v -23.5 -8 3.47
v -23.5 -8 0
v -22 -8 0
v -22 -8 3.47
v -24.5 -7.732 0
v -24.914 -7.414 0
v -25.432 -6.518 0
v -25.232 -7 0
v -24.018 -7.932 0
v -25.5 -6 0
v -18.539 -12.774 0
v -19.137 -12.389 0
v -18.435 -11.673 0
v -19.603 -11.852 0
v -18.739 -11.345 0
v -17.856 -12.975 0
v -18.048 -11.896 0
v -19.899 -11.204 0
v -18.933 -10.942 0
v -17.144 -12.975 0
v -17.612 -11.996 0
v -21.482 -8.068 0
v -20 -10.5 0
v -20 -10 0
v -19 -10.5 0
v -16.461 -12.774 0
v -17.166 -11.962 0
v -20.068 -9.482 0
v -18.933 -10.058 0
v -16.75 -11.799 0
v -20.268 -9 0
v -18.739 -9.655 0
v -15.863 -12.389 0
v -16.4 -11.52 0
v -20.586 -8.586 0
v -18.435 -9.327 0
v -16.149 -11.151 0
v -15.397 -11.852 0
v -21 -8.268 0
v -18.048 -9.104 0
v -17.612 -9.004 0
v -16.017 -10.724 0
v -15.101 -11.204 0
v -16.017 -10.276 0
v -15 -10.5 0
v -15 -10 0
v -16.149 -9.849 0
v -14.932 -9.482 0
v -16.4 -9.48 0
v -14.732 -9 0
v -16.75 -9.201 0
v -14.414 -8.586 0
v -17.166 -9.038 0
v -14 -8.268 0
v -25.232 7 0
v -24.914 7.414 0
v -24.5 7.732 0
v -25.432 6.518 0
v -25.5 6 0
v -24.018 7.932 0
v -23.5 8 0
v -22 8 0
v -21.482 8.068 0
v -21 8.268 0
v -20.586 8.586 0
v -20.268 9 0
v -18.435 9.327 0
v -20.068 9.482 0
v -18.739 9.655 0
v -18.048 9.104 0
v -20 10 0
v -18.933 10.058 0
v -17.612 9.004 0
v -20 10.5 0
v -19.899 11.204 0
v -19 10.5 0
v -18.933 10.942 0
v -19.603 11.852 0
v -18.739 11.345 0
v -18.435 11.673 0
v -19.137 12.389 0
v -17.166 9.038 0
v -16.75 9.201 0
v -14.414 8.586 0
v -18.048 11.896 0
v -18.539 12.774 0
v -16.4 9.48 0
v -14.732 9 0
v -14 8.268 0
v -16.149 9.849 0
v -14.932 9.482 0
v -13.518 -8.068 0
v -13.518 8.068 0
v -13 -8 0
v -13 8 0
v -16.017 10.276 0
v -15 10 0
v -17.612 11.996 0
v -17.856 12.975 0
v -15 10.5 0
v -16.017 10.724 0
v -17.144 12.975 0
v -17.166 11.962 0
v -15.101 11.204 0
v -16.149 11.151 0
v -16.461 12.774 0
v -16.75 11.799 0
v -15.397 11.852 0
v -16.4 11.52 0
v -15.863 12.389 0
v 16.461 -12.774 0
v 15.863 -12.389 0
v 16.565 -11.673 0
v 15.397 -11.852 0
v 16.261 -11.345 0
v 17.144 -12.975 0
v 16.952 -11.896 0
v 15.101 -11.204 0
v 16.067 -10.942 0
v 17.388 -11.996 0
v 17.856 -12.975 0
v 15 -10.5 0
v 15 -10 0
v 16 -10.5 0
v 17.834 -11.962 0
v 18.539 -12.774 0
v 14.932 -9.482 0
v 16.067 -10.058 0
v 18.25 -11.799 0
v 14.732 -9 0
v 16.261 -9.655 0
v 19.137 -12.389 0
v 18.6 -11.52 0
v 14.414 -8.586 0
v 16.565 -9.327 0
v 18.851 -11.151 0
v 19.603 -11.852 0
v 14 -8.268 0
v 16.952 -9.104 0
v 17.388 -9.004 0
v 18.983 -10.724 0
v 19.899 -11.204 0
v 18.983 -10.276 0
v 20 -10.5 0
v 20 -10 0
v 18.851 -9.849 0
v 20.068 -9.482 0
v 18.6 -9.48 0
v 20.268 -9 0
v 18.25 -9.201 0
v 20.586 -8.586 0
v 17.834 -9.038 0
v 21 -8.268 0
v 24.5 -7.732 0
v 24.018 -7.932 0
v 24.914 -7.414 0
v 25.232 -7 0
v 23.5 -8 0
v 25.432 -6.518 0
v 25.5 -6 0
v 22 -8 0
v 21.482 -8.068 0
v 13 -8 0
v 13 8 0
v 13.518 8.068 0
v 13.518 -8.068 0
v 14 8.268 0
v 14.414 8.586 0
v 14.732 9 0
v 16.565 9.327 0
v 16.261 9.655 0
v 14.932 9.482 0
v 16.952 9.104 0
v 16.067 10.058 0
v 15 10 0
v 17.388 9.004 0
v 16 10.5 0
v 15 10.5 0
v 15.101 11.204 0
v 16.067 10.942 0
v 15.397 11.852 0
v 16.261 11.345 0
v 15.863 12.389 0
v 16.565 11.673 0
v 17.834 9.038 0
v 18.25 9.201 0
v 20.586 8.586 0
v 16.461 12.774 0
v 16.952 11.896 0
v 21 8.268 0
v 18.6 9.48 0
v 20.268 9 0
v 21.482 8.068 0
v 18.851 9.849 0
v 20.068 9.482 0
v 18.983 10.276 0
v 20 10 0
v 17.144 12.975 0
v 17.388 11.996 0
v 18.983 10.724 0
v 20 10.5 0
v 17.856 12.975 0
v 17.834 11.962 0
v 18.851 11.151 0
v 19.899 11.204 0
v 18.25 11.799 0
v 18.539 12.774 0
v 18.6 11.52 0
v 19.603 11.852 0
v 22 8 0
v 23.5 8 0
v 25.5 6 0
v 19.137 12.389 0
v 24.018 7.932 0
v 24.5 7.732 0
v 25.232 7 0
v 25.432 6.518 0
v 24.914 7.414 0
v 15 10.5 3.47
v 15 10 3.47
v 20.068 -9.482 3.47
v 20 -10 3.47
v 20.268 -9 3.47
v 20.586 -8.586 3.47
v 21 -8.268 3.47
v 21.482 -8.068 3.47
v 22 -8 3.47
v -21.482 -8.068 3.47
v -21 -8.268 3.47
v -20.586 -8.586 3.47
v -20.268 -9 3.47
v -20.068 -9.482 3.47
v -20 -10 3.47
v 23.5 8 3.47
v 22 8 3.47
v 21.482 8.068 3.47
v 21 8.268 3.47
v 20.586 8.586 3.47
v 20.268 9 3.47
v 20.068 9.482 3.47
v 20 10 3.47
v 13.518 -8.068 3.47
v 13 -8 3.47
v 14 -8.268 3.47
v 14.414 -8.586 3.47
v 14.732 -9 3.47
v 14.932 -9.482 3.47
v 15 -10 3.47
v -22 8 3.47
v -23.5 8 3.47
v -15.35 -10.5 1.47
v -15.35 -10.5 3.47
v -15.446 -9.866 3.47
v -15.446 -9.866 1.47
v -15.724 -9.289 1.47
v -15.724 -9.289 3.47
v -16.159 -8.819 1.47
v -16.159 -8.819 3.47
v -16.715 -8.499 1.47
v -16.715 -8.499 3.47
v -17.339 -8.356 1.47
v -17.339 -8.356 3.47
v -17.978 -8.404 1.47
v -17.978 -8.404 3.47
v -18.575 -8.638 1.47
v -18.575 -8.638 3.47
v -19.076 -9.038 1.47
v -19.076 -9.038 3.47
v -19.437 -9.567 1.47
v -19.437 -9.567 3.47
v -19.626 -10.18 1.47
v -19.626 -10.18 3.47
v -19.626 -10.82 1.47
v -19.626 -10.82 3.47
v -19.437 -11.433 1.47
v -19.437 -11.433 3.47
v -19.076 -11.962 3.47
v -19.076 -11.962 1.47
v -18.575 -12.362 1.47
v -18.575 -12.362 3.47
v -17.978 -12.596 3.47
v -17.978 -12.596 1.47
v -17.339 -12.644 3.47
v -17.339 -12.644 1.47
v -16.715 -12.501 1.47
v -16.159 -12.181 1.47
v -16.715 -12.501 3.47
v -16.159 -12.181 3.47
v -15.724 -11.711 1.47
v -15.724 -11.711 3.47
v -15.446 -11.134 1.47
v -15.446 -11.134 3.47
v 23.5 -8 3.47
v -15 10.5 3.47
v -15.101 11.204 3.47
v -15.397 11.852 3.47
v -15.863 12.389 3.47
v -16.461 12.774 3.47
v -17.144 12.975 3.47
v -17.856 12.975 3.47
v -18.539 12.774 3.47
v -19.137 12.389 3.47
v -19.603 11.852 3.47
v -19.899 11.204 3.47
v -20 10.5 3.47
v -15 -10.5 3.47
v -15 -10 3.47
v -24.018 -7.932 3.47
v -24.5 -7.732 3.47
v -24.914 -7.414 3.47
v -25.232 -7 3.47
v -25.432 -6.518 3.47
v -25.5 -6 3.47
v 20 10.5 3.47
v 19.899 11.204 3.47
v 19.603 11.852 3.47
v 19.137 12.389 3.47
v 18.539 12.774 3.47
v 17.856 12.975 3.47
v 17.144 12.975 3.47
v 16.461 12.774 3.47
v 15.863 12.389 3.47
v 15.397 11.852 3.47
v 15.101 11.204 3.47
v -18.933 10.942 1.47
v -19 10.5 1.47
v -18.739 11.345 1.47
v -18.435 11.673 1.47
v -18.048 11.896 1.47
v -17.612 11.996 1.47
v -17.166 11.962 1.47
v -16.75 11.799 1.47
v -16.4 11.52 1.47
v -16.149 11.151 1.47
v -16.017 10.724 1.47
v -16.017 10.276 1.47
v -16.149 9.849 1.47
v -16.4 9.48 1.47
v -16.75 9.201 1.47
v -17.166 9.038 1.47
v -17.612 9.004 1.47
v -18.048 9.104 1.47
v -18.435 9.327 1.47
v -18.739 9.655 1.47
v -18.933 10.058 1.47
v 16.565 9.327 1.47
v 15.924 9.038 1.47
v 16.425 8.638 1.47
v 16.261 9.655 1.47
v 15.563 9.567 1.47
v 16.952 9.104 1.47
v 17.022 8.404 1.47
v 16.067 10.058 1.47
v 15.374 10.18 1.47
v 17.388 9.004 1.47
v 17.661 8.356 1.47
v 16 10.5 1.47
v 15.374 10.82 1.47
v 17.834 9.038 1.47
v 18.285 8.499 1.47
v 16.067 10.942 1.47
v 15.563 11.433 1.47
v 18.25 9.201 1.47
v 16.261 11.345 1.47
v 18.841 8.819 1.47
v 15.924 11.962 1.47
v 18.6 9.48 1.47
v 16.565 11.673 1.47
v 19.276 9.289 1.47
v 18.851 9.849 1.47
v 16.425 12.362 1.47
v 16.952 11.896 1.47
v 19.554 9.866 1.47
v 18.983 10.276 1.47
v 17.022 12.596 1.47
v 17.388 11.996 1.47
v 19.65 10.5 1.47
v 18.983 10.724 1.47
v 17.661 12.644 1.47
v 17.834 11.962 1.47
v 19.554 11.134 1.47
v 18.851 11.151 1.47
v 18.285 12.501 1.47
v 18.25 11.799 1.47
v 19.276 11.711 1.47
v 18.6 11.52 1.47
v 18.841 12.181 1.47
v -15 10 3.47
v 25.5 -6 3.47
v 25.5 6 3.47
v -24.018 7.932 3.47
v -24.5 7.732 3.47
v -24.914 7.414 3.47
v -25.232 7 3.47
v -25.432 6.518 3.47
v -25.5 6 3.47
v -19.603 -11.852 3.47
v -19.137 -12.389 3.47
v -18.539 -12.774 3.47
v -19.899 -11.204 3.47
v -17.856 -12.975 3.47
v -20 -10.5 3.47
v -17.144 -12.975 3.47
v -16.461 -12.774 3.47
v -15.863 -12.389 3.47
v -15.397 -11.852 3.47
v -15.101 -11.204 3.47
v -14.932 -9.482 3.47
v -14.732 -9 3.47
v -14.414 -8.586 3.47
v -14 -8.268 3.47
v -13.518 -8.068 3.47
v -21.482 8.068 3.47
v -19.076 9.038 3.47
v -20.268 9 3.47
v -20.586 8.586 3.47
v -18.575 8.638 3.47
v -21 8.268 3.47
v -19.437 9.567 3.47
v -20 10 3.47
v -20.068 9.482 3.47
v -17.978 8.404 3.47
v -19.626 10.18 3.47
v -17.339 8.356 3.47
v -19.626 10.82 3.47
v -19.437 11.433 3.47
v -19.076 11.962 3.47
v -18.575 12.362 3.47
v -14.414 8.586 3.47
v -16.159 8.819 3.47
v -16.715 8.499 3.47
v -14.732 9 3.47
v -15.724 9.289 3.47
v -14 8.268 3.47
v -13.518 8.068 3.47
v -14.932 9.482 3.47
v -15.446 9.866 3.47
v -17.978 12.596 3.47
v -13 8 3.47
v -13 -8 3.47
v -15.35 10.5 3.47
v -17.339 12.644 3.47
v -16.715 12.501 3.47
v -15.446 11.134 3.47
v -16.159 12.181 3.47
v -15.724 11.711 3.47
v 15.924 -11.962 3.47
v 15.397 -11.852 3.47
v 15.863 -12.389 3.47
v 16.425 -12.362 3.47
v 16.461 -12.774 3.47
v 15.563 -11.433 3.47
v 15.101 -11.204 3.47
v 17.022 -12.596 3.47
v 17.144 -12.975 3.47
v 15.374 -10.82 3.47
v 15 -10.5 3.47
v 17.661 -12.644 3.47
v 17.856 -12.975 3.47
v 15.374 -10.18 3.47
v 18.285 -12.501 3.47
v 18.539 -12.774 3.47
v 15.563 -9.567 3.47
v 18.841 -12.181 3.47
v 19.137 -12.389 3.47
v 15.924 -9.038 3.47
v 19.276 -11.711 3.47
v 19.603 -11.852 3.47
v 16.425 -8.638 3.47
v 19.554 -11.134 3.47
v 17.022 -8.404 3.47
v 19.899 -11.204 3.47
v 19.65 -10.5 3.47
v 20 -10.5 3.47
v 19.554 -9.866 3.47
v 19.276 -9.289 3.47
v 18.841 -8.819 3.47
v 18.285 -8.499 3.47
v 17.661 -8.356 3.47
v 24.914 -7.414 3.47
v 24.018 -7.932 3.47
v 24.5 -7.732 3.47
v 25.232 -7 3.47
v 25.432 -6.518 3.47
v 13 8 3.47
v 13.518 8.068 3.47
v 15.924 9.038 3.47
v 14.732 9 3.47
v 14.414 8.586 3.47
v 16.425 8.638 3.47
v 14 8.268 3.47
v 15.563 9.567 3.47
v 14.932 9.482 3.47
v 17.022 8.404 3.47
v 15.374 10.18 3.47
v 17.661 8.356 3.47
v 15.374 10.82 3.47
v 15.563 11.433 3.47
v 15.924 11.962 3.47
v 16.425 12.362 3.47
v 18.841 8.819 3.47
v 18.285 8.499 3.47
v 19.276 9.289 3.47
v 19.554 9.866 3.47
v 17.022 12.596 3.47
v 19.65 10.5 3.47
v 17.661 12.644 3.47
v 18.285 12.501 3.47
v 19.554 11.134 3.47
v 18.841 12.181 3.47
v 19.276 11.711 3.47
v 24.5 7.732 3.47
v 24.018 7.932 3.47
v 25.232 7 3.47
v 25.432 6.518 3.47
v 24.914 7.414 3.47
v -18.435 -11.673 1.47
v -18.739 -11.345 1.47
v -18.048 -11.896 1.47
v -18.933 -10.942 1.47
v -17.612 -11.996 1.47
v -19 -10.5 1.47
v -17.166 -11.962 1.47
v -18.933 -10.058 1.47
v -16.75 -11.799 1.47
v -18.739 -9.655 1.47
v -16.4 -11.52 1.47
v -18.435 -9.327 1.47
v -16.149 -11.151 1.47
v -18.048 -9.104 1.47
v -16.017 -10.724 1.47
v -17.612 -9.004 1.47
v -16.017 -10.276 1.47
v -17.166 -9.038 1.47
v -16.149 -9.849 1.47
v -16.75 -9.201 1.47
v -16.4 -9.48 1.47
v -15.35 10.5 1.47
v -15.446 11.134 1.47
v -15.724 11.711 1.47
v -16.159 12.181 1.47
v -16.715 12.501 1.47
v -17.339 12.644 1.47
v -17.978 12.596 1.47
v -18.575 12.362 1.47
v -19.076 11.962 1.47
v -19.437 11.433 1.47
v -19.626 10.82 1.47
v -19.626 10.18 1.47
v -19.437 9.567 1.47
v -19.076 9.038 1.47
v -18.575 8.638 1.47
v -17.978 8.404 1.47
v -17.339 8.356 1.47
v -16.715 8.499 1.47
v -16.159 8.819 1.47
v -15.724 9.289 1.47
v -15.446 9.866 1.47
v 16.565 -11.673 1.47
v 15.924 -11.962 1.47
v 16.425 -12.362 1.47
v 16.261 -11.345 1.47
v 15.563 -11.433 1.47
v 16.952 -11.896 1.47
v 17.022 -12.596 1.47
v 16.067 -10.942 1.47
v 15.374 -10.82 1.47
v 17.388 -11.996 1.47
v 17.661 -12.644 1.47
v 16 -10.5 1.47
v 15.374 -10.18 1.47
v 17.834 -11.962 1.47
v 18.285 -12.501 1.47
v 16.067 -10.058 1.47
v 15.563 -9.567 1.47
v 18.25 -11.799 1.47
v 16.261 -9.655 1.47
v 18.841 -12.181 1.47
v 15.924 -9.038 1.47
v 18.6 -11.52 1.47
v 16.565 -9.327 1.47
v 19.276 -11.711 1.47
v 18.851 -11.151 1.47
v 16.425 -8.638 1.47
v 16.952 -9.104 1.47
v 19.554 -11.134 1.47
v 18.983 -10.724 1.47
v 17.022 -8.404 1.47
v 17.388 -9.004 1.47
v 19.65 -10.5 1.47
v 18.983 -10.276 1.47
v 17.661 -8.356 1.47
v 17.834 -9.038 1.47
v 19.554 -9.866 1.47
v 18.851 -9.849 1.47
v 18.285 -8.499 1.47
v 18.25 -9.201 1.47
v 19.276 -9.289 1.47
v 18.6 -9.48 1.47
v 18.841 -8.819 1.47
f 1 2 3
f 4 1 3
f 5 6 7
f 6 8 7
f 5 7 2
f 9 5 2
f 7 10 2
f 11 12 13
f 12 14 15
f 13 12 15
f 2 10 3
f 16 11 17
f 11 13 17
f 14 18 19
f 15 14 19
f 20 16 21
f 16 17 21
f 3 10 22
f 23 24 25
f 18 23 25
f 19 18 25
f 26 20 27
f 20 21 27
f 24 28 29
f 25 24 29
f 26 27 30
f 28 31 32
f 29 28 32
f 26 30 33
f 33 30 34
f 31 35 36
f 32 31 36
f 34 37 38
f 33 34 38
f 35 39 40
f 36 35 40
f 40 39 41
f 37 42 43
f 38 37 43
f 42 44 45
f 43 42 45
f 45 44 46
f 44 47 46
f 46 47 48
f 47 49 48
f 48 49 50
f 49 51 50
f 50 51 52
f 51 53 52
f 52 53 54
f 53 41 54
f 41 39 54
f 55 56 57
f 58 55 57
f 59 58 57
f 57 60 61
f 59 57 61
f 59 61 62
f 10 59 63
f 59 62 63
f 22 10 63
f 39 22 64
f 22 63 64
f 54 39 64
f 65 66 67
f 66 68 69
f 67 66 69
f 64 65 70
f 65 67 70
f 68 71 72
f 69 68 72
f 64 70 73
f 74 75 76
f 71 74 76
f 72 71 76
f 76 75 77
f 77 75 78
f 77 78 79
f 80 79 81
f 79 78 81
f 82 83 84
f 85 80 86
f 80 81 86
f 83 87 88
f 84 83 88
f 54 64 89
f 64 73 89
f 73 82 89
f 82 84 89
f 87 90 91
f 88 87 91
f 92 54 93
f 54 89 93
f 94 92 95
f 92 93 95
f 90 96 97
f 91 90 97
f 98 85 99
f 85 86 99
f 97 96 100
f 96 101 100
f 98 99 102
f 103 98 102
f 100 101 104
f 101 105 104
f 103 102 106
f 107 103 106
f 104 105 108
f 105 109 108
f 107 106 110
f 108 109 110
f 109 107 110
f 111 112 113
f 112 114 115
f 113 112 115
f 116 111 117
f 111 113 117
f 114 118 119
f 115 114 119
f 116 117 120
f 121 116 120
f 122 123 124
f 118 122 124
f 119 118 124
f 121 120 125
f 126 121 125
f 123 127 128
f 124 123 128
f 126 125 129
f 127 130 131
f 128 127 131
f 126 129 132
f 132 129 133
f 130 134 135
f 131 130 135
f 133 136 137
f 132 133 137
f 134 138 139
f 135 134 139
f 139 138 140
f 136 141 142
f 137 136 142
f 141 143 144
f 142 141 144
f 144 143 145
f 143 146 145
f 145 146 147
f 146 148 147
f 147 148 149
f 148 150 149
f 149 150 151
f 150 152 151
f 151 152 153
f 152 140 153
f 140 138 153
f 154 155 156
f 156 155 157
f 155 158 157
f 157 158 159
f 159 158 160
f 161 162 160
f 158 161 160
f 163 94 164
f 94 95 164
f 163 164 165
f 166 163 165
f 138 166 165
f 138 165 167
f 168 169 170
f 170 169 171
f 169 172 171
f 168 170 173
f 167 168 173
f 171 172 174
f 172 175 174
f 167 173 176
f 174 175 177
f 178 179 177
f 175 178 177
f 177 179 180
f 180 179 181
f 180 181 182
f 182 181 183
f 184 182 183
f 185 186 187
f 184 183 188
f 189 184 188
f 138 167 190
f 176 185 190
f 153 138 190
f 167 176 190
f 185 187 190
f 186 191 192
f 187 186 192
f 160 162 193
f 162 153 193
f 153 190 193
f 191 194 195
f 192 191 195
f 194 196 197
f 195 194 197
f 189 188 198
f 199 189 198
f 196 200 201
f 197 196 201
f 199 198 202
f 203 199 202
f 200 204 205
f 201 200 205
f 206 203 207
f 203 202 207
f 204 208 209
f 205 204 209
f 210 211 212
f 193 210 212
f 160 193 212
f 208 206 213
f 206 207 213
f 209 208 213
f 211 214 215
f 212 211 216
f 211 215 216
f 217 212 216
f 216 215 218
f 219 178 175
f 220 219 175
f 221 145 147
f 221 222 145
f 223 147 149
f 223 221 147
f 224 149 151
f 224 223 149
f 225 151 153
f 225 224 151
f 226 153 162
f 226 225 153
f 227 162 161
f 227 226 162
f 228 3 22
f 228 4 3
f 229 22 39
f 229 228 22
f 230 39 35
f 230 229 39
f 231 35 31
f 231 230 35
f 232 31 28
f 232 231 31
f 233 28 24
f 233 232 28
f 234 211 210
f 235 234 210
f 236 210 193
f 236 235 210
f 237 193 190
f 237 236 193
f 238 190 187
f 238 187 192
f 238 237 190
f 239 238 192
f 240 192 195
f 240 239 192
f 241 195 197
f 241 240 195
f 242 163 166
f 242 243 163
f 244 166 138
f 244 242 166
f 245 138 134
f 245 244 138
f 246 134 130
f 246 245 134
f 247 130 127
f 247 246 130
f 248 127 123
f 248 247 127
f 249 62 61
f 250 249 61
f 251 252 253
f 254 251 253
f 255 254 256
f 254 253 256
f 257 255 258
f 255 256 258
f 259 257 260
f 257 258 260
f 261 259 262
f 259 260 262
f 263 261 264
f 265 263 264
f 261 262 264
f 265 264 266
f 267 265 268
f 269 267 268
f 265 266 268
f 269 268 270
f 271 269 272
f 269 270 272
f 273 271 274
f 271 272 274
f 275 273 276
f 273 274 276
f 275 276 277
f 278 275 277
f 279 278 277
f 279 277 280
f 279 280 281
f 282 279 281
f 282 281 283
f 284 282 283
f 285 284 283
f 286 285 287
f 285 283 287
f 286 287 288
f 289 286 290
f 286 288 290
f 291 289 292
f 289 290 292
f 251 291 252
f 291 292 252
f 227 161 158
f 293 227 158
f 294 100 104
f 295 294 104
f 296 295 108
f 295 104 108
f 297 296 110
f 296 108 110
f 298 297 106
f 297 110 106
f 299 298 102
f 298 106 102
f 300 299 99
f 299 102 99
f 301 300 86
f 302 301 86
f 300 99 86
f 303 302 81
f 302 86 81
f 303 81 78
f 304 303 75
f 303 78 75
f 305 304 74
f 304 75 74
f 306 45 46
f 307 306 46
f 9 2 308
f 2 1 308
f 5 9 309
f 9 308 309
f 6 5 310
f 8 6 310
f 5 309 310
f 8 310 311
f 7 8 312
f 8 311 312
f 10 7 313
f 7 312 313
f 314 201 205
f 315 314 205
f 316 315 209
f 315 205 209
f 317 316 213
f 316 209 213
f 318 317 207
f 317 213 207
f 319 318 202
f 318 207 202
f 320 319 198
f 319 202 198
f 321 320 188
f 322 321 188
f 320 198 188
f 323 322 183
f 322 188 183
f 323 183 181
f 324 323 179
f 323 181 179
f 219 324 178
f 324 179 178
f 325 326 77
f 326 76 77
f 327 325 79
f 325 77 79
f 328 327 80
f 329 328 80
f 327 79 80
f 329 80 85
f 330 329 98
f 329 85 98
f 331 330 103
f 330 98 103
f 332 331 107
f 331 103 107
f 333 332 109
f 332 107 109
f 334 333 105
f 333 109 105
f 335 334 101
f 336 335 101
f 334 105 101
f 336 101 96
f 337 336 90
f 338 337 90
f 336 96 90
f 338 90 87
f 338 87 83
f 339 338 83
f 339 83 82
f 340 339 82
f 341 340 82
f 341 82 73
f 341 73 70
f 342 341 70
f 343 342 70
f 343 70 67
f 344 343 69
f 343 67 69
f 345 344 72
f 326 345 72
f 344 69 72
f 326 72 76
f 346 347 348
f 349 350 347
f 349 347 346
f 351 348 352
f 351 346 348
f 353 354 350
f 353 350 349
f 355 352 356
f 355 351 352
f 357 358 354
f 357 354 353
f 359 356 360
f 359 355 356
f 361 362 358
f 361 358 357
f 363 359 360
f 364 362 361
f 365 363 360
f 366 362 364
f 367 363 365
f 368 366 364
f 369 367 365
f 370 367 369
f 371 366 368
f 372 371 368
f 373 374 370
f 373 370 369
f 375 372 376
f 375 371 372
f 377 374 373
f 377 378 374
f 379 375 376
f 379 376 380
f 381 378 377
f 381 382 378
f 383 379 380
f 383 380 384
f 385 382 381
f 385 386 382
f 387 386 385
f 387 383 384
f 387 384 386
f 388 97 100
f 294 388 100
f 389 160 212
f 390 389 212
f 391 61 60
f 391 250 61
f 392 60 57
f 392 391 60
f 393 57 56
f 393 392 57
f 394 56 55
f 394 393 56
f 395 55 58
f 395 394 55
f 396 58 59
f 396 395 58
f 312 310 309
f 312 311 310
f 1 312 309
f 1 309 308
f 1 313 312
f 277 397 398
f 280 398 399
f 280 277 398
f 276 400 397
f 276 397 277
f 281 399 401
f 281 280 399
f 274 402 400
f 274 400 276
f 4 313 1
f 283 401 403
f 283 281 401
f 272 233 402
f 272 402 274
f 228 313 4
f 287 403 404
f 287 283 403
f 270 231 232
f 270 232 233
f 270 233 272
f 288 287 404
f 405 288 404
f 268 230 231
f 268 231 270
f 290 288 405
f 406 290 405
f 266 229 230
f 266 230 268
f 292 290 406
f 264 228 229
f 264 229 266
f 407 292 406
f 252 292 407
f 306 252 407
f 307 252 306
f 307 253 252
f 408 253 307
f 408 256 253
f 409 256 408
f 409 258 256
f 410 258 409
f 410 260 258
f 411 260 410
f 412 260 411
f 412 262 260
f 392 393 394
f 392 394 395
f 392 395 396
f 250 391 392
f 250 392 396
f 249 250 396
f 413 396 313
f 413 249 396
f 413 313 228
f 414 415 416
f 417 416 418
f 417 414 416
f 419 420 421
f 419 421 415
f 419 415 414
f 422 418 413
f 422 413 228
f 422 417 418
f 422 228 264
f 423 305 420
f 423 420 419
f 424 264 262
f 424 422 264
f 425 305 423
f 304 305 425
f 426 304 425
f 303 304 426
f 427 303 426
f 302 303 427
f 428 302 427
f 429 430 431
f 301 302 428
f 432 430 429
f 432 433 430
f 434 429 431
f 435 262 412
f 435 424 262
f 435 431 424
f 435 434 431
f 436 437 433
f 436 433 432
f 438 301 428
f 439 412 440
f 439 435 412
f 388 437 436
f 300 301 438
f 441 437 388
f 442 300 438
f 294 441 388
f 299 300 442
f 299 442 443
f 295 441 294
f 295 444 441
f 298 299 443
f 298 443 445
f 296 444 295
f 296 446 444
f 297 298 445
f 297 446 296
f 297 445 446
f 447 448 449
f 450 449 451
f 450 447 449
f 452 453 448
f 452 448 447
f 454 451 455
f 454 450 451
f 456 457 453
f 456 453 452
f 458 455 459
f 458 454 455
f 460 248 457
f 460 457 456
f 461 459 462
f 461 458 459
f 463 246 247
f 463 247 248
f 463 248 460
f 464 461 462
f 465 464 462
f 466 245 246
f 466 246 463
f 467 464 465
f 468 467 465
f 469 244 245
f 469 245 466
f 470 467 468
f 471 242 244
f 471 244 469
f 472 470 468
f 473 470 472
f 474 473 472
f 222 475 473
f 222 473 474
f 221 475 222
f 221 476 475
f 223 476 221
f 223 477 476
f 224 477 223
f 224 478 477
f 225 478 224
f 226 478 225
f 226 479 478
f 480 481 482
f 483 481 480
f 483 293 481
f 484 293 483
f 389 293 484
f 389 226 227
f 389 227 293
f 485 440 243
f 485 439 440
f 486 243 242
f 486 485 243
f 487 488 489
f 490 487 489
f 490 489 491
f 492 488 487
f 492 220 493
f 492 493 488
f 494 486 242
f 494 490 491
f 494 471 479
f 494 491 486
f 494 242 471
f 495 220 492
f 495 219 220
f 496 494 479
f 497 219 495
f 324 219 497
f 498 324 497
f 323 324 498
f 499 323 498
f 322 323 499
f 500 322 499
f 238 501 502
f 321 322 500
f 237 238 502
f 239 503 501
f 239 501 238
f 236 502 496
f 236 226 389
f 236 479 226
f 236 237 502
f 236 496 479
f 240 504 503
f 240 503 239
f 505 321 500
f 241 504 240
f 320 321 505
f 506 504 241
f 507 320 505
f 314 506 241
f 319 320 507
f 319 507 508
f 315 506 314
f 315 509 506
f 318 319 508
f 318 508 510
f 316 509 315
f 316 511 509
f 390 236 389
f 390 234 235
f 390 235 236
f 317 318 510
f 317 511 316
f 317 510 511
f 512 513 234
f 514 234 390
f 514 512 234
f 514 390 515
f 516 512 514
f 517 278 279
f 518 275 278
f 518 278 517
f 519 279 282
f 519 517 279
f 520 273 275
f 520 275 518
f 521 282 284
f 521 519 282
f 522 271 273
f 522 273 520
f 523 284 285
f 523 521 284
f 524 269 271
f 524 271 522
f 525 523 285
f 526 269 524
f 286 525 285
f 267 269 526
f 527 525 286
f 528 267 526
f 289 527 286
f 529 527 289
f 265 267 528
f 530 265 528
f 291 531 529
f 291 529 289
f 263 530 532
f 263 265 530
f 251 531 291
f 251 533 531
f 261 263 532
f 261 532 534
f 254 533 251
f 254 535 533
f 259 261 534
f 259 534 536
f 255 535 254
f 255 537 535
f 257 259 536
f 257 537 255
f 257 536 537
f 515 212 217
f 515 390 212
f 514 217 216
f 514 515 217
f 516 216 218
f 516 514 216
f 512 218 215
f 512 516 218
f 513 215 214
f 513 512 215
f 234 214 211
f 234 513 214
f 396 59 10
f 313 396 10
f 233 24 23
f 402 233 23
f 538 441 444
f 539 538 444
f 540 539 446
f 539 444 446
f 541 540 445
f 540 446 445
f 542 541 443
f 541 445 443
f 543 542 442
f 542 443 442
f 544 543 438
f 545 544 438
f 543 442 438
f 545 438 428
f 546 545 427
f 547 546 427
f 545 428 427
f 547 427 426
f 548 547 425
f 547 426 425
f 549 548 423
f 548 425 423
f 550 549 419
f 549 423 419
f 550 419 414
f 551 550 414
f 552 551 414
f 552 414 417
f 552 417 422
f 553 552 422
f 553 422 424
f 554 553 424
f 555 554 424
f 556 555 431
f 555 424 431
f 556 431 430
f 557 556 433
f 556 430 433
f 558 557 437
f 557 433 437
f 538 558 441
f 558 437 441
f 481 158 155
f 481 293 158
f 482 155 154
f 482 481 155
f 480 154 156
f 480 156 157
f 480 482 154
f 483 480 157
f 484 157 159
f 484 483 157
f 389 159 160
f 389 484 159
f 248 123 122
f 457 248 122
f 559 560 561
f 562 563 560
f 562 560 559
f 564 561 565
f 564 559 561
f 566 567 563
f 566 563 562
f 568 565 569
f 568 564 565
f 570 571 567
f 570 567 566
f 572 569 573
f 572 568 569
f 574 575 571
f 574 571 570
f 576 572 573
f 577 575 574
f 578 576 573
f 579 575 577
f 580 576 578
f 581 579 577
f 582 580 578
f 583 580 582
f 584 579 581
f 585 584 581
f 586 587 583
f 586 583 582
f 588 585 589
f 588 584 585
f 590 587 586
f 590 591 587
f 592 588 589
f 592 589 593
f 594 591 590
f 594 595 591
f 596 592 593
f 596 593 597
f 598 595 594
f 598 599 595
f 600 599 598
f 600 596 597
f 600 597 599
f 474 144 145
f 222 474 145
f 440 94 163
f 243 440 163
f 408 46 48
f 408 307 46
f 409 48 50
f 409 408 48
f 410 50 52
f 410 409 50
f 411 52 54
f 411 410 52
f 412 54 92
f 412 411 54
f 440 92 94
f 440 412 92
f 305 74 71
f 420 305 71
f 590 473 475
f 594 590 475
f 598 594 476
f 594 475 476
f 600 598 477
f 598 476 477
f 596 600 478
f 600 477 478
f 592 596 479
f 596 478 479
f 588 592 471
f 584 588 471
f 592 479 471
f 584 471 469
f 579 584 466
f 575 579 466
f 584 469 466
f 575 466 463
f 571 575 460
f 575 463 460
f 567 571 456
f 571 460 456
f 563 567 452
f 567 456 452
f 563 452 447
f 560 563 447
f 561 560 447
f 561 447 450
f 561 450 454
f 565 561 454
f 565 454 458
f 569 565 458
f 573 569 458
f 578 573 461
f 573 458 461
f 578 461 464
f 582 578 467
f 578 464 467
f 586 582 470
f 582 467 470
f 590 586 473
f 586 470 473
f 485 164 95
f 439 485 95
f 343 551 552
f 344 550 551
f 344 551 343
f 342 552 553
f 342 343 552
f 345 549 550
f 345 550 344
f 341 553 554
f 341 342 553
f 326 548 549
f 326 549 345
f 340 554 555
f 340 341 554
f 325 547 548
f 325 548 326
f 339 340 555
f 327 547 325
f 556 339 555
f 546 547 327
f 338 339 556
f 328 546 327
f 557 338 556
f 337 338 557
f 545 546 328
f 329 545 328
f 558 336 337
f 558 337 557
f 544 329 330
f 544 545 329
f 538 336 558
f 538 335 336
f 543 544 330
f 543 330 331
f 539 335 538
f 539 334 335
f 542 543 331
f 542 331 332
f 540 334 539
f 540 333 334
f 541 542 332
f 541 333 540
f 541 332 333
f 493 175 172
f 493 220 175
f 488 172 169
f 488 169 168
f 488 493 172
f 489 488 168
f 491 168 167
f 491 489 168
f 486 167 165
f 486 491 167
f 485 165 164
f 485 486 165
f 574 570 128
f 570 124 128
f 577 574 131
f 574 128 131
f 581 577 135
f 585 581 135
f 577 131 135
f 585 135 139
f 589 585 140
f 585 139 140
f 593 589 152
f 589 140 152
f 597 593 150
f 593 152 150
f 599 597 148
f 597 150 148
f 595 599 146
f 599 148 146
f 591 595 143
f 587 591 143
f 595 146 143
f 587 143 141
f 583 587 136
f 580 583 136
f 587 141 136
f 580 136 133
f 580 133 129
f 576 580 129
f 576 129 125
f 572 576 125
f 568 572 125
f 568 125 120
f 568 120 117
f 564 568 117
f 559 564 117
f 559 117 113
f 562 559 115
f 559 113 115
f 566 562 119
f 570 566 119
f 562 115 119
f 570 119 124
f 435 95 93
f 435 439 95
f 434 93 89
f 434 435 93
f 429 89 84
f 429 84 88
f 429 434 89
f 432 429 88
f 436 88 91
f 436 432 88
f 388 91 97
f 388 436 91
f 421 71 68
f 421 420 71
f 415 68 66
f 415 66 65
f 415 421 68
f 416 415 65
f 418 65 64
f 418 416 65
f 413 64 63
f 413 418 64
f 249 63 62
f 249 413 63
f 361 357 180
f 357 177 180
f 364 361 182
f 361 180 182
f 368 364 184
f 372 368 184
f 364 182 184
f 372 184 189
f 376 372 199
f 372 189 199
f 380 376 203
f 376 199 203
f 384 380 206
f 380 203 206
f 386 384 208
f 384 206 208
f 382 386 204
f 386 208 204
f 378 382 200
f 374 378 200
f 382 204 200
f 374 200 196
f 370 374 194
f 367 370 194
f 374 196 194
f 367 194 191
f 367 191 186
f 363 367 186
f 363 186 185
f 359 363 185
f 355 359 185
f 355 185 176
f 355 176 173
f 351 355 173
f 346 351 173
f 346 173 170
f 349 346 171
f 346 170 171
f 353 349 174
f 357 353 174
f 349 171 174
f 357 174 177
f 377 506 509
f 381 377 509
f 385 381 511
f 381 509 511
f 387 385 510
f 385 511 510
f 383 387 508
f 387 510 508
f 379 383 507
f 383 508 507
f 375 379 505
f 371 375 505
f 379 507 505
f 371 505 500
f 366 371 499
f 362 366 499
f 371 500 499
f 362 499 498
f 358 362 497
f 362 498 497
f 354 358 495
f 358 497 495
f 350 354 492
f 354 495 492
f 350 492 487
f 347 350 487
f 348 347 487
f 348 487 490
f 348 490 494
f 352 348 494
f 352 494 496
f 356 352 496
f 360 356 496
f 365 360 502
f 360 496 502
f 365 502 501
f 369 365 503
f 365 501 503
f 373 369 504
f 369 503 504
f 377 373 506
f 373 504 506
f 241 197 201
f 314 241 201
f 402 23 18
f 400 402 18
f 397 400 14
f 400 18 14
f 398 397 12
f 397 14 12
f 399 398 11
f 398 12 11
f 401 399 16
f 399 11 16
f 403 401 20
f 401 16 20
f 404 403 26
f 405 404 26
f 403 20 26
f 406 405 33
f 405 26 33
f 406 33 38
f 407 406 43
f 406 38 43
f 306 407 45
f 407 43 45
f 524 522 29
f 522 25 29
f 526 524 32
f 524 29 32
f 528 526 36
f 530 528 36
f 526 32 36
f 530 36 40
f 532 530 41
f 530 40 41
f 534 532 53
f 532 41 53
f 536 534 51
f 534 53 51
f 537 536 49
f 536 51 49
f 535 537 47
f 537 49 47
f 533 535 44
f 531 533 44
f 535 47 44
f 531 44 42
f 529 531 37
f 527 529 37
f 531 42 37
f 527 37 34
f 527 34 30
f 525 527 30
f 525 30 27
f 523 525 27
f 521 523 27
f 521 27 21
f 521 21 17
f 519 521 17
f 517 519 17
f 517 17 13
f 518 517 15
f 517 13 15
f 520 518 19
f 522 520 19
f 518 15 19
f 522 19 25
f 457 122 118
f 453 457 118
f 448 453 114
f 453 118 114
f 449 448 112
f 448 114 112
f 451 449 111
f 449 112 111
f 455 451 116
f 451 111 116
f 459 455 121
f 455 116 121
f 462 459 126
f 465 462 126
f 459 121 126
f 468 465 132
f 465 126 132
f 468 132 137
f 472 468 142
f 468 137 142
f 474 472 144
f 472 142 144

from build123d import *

# Parameters (mm, degrees)
EXTRUDE_1_DEPTH     = 3.47
FILLET_1_R          = 2
MM_1_D              = 3
MM_1_CSINK_D        = 3.05
MM_1_CSINK_ANGLE    = 90
SKETCH_5_R          = 2.15
CUT_EXTRUDE_1_DEPTH = 2


with BuildPart() as part:
    # 草图1 → 凸台-拉伸1 (new body)
    with BuildSketch(Plane.XY):
        with BuildLine():
            Line((-25.5, -8), (-20, -8))
            Line((-20, -8), (-20, -10.5))
            ThreePointArc((-20, -10.5), (-17.5, -13), (-15, -10.5))
            Line((-15, -10.5), (-15, -8))
            Line((-15, -8), (15, -8))
            Line((15, -8), (15, -10.5))
            ThreePointArc((15, -10.5), (17.5, -13), (20, -10.5))
            Line((20, -10.5), (20, -8))
            Line((20, -8), (25.5, -8))
            Line((25.5, -8), (25.5, 8))
            Line((25.5, 8), (20, 8))
            Line((20, 8), (20, 10.5))
            ThreePointArc((20, 10.5), (17.5, 13), (15, 10.5))
            Line((15, 10.5), (15, 8))
            Line((15, 8), (-15, 8))
            Line((-15, 8), (-15, 10.5))
            ThreePointArc((-15, 10.5), (-17.5, 13), (-20, 10.5))
            Line((-20, 10.5), (-20, 8))
            Line((-20, 8), (-25.5, 8))
            Line((-25.5, 8), (-25.5, -8))
        make_face()
    extrude(amount=EXTRUDE_1_DEPTH)

    # 圆角1
    fillet_1_edges = [part.edges().sort_by_distance(p)[0] for p in [
        (25.5, 8, 1.735),
        (25.5, -8, 1.735),
        (20, -8, 1.735),
        (15, -8, 1.735),
        (-15, -8, 1.735),
        (-20, -8, 1.735),
        (-25.5, -8, 1.735),
        (-25.5, 8, 1.735),
        (-20, 8, 1.735),
        (-15, 8, 1.735),
        (15, 8, 1.735),
        (20, 8, 1.735),
    ]]
    fillet(fillet_1_edges, radius=FILLET_1_R)

    # 大小mm 暗销孔1 (through all)
    with Locations(Plane.XY.offset(3.47)):
        with Locations((-17.5, 10.5), (-17.5, -10.5), (17.5, -10.5), (17.5, 10.5)):
            CounterSinkHole(MM_1_D / 2, MM_1_CSINK_D / 2, counter_sink_angle=MM_1_CSINK_ANGLE)

    # 草图5 → 切除-拉伸1 (cut)
    with BuildSketch(Plane.XY.offset(3.47)):
        with Locations((-17.5, 10.5)):
            Circle(SKETCH_5_R)
        with Locations((17.5, 10.5)):
            Circle(SKETCH_5_R)
        with Locations((-17.5, -10.5)):
            Circle(SKETCH_5_R)
        with Locations((17.5, -10.5)):
            Circle(SKETCH_5_R)
    extrude(amount=-CUT_EXTRUDE_1_DEPTH, mode=Mode.SUBTRACT)


solid = part.part
